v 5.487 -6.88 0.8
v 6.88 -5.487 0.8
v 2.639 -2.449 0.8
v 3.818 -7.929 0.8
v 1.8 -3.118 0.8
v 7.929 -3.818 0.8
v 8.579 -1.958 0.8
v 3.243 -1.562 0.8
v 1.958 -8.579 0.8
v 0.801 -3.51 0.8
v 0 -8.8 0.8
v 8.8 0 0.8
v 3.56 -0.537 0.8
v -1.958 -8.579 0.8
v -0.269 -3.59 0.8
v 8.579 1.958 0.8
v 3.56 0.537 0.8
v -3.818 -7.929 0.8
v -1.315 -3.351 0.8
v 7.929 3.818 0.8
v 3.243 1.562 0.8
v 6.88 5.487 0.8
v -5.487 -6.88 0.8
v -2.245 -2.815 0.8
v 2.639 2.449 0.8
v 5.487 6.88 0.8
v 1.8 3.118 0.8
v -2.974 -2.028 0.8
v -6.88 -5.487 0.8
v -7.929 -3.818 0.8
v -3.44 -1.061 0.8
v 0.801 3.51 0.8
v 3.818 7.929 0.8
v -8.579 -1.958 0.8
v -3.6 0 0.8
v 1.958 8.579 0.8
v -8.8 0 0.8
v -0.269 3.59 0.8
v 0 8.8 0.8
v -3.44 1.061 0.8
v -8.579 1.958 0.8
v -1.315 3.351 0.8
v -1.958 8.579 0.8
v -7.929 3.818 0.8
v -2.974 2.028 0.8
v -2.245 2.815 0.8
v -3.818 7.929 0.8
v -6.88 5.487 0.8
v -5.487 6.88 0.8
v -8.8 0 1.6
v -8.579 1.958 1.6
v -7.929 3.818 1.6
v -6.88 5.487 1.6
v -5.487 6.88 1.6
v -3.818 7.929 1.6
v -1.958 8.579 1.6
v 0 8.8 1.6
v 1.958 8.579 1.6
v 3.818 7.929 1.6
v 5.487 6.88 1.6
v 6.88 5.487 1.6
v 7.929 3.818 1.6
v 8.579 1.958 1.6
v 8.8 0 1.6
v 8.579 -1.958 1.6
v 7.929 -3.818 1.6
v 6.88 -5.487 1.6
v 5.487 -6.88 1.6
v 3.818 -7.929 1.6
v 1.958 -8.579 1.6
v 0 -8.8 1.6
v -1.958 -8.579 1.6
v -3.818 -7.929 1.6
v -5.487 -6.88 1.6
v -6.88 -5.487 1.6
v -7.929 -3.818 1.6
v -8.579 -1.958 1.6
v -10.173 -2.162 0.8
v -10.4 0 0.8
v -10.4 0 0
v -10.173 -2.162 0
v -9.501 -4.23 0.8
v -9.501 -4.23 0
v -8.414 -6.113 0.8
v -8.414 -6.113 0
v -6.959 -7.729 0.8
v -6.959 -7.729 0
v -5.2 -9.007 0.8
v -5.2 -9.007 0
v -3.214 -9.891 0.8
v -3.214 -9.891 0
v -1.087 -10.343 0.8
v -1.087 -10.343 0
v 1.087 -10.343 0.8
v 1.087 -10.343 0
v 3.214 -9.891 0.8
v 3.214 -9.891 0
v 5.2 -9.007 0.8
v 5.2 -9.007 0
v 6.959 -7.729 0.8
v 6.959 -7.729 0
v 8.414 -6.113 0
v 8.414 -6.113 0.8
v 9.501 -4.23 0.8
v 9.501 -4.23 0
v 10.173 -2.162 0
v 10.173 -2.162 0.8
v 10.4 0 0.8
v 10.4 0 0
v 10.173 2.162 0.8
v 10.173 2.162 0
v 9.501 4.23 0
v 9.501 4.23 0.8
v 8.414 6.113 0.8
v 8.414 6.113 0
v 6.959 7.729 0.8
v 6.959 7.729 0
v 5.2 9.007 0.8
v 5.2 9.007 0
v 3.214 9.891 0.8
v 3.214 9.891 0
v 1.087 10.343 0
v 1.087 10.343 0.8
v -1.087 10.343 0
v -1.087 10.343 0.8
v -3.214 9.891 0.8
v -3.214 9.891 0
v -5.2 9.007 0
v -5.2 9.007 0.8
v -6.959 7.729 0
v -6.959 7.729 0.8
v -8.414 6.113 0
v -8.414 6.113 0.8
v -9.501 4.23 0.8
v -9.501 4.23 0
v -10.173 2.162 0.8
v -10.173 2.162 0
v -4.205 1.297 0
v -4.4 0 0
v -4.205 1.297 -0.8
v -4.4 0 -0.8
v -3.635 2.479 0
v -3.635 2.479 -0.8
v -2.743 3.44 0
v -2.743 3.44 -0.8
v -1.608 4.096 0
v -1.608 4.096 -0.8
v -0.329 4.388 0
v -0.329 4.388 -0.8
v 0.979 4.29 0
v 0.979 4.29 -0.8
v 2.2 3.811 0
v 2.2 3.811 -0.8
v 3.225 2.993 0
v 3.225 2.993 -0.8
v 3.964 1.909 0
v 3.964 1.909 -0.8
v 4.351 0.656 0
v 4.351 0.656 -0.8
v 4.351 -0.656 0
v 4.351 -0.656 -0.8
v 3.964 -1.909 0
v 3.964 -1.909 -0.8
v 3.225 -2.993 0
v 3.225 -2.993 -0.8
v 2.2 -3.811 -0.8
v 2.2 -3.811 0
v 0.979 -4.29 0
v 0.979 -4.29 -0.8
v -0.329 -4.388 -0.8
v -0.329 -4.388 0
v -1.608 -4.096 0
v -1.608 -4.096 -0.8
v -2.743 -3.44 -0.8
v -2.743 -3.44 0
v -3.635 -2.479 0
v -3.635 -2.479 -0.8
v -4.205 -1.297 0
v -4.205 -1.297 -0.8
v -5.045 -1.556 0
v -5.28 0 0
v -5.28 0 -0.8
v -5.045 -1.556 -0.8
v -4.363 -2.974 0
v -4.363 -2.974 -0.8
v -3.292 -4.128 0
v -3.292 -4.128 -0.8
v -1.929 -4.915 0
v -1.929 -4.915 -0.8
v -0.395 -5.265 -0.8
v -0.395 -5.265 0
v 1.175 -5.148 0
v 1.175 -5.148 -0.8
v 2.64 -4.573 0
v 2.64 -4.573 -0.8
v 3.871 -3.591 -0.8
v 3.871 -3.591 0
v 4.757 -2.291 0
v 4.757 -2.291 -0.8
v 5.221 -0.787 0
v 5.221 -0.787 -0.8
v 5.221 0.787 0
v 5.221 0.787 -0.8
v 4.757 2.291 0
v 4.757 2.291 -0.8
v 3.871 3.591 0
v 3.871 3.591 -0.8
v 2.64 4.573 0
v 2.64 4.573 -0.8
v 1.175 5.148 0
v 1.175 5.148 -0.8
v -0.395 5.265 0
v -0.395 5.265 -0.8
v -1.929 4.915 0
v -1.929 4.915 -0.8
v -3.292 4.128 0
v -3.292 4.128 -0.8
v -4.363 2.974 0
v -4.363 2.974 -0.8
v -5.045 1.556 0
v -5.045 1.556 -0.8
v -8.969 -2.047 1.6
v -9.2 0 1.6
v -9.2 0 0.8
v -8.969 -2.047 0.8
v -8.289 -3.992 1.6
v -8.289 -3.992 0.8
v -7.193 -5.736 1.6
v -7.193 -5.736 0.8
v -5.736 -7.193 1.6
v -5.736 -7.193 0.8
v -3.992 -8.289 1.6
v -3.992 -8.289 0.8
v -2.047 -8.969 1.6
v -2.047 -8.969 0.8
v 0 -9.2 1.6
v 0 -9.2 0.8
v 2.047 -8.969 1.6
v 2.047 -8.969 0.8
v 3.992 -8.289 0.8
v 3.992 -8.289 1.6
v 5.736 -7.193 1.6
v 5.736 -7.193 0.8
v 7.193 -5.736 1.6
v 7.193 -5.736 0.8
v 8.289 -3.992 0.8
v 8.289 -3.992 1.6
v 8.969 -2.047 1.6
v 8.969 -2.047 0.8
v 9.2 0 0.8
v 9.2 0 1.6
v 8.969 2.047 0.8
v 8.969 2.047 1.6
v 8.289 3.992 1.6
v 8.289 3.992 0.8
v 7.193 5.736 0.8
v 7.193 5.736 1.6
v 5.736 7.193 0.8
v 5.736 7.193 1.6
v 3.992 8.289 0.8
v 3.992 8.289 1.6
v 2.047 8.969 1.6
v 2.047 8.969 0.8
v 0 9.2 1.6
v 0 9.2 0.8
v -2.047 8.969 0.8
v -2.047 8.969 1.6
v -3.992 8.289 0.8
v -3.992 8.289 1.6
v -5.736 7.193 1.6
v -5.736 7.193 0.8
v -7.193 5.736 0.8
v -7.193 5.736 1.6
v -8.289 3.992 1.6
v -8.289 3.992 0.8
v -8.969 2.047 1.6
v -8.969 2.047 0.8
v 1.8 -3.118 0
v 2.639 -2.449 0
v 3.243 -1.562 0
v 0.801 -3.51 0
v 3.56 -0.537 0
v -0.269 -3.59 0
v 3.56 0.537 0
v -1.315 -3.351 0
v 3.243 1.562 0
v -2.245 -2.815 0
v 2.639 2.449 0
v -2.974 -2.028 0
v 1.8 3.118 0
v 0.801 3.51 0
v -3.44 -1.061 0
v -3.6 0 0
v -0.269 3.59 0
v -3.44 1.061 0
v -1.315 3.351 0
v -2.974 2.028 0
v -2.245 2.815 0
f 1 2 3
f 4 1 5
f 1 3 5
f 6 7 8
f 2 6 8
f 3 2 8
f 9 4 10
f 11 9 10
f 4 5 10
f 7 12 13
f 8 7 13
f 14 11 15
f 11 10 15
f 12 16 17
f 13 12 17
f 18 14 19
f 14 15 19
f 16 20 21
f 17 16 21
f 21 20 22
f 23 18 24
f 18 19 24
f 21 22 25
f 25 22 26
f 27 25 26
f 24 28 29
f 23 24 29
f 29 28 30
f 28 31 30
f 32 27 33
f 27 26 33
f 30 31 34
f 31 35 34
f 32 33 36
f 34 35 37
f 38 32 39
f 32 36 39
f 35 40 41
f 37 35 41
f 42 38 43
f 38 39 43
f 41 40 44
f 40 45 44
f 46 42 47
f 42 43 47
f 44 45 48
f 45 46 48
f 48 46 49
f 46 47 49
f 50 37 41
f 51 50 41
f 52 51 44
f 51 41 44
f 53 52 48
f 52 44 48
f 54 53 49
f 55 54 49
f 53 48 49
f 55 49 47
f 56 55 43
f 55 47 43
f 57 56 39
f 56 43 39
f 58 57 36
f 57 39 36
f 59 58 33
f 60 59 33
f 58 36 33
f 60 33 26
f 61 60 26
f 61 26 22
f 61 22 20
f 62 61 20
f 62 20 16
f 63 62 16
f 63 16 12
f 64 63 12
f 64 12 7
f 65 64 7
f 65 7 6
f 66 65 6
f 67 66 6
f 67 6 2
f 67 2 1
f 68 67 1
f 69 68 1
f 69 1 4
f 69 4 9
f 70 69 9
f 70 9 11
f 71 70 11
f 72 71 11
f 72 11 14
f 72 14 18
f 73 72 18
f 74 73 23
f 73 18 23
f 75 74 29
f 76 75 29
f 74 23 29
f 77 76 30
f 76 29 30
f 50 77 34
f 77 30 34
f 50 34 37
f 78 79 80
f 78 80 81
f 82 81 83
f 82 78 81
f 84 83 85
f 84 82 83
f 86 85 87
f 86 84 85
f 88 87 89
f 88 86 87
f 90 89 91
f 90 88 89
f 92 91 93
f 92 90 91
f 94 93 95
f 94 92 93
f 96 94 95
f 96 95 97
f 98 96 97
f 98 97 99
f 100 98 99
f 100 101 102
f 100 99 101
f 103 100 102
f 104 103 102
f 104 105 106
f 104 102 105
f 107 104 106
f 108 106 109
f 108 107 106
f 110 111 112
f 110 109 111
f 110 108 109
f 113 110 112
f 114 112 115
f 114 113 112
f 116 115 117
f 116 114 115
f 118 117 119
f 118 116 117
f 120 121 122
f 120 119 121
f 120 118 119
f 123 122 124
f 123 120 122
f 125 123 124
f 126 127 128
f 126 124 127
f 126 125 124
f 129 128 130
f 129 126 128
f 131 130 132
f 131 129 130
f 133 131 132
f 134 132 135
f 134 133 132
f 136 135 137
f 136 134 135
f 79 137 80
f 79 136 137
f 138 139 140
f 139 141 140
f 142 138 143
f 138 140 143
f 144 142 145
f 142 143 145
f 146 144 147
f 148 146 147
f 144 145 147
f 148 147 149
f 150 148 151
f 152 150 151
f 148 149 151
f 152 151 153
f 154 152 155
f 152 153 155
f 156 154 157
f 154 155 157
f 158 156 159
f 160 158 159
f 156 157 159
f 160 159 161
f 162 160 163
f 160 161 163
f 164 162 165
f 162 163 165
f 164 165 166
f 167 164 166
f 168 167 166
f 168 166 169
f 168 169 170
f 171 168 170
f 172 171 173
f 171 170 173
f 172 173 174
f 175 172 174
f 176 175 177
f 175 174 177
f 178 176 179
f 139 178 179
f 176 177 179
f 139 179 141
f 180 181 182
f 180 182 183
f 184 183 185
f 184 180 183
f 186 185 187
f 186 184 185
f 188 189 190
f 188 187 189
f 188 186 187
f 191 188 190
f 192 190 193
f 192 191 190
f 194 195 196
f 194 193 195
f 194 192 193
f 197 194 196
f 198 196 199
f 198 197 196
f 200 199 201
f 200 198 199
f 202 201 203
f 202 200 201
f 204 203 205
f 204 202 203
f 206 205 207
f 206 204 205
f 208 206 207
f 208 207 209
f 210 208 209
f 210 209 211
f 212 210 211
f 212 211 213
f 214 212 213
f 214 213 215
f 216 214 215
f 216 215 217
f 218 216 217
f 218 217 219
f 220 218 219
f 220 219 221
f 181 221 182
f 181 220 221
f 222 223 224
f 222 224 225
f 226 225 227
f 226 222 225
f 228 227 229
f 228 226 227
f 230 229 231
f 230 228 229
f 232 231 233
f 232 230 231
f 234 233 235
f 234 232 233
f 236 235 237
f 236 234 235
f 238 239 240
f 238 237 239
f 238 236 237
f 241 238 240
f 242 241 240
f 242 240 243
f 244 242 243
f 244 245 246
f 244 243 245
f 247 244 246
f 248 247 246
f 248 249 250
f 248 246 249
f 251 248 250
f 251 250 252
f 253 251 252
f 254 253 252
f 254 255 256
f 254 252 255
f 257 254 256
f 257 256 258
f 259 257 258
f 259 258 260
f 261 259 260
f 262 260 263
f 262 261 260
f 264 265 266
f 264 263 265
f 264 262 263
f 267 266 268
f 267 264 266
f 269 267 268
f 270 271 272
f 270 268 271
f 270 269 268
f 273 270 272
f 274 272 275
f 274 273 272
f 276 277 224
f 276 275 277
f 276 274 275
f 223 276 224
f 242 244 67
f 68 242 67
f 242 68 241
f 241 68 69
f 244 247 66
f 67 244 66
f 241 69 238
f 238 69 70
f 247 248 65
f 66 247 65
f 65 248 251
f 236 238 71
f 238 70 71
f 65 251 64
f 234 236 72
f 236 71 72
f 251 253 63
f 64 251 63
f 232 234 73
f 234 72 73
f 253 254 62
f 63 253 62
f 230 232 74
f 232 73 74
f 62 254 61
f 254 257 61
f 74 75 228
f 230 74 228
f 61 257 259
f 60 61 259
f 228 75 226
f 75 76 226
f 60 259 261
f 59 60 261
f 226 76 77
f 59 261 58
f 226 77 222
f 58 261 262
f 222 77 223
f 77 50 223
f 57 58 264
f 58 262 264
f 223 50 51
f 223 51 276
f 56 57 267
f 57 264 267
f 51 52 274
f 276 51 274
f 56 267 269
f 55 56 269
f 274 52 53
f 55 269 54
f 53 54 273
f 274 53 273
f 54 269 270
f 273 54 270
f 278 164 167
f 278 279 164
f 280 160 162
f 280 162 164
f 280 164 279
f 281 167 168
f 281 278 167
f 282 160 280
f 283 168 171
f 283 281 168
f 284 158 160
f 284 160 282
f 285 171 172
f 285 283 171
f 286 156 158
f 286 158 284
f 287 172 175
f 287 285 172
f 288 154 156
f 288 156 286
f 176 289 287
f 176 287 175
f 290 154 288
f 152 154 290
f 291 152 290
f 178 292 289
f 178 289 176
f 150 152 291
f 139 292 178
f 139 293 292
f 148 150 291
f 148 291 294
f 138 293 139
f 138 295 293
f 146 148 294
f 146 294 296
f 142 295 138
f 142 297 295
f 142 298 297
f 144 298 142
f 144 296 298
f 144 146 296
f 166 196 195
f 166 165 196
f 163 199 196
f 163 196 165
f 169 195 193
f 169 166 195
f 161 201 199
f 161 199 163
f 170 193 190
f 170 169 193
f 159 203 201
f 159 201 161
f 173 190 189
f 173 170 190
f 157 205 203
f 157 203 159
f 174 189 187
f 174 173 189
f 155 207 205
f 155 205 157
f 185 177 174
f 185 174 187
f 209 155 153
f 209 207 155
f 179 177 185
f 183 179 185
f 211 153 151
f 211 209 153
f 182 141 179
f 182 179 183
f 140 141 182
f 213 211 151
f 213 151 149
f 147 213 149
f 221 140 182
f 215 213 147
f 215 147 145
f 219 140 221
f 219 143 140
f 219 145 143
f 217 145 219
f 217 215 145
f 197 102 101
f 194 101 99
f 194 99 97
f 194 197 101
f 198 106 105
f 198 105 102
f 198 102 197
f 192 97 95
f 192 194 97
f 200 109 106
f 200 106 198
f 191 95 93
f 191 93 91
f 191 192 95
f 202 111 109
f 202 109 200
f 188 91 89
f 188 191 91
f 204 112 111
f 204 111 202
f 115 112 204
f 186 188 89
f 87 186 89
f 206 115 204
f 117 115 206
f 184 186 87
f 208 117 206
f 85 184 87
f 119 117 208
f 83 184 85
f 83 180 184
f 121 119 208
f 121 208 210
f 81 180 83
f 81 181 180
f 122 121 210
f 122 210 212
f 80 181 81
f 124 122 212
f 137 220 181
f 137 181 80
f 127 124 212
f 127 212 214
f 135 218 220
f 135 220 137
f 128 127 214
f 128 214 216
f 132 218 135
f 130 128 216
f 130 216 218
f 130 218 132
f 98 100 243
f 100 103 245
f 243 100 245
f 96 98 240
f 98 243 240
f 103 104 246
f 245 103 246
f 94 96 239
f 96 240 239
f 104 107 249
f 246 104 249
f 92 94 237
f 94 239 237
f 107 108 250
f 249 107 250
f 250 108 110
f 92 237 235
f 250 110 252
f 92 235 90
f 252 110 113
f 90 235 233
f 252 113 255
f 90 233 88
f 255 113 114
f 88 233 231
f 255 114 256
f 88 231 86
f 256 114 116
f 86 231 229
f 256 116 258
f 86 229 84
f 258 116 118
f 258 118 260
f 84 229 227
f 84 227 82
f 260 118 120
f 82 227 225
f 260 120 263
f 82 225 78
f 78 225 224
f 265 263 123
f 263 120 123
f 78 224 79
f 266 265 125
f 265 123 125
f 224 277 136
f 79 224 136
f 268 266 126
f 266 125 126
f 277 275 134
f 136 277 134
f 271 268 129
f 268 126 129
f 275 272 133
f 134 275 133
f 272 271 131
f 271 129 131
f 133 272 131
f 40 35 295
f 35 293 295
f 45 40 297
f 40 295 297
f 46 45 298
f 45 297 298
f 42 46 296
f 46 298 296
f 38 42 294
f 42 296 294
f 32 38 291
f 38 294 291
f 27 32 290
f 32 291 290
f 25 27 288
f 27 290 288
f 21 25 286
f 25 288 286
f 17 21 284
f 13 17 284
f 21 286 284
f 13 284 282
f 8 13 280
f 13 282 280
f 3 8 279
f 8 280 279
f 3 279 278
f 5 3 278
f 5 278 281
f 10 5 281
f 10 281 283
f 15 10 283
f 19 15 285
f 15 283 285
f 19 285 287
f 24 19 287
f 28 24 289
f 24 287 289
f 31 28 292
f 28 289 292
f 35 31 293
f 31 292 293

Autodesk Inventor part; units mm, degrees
ref_plane "YZ Plane" through (0, 0, 0) normal (1, 0, 0) x (0, 1, 0)
ref_plane "XZ Plane" through (0, 0, 0) normal (0, 1, 0) x (-1, 0, 0)
ref_plane "XY Plane" through (0, 0, 0) normal (0, 0, 1) x (1, 0, 0)
sketch "Sketch2" plane through (0, 0, 0) normal (0, 1, 0) x (-1, 0, 0)
  line L0 (0, 0.8) -> (0, -0.8)
  line L1 (3.6, 0.8) -> (3.6, 0)
  line L2 (3.6, 0) -> (4.4, 0)
  line L3 (4.4, 0) -> (4.4, -0.8)
  line L4 (4.4, -0.8) -> (5.28, -0.8)
  line L5 (5.28, -0.8) -> (5.28, 0)
  line L6 (5.28, 0) -> (10.4, 0)
  line L7 (10.4, 0) -> (10.4, 0.8)
  line L8 (10.4, 0.8) -> (9.2, 0.8)
  line L9 (9.2, 0.8) -> (9.2, 1.6)
  line L10 (9.2, 1.6) -> (8.8, 1.6)
  line L11 (8.8, 1.6) -> (8.8, 0.8)
  line L12 (8.8, 0.8) -> (3.6, 0.8)
  point P0 (0, 0)
  point P1 (0, 0)
  dimension "d0" = 8.8
  dimension "d1" = 10.56
  dimension "d2" = 0.8
  dimension "d3" = 20.8
  dimension "d5" = 0.8
  dimension "d6" = 7.2
  dimension "d7" = 18.4
  dimension "d8" = 17.6
  dimension "d9" = 0.8
revolve "Revolution1" add sketch "Sketch2" angle 360 about axis through (0, 0, 0.8) along (0, 0, -1)
equation "\"d6\" = tlad"
equation "\"tlad\" = 7.2"
properties part number "99542-MilkyWhite" material "ABS Plastic"
